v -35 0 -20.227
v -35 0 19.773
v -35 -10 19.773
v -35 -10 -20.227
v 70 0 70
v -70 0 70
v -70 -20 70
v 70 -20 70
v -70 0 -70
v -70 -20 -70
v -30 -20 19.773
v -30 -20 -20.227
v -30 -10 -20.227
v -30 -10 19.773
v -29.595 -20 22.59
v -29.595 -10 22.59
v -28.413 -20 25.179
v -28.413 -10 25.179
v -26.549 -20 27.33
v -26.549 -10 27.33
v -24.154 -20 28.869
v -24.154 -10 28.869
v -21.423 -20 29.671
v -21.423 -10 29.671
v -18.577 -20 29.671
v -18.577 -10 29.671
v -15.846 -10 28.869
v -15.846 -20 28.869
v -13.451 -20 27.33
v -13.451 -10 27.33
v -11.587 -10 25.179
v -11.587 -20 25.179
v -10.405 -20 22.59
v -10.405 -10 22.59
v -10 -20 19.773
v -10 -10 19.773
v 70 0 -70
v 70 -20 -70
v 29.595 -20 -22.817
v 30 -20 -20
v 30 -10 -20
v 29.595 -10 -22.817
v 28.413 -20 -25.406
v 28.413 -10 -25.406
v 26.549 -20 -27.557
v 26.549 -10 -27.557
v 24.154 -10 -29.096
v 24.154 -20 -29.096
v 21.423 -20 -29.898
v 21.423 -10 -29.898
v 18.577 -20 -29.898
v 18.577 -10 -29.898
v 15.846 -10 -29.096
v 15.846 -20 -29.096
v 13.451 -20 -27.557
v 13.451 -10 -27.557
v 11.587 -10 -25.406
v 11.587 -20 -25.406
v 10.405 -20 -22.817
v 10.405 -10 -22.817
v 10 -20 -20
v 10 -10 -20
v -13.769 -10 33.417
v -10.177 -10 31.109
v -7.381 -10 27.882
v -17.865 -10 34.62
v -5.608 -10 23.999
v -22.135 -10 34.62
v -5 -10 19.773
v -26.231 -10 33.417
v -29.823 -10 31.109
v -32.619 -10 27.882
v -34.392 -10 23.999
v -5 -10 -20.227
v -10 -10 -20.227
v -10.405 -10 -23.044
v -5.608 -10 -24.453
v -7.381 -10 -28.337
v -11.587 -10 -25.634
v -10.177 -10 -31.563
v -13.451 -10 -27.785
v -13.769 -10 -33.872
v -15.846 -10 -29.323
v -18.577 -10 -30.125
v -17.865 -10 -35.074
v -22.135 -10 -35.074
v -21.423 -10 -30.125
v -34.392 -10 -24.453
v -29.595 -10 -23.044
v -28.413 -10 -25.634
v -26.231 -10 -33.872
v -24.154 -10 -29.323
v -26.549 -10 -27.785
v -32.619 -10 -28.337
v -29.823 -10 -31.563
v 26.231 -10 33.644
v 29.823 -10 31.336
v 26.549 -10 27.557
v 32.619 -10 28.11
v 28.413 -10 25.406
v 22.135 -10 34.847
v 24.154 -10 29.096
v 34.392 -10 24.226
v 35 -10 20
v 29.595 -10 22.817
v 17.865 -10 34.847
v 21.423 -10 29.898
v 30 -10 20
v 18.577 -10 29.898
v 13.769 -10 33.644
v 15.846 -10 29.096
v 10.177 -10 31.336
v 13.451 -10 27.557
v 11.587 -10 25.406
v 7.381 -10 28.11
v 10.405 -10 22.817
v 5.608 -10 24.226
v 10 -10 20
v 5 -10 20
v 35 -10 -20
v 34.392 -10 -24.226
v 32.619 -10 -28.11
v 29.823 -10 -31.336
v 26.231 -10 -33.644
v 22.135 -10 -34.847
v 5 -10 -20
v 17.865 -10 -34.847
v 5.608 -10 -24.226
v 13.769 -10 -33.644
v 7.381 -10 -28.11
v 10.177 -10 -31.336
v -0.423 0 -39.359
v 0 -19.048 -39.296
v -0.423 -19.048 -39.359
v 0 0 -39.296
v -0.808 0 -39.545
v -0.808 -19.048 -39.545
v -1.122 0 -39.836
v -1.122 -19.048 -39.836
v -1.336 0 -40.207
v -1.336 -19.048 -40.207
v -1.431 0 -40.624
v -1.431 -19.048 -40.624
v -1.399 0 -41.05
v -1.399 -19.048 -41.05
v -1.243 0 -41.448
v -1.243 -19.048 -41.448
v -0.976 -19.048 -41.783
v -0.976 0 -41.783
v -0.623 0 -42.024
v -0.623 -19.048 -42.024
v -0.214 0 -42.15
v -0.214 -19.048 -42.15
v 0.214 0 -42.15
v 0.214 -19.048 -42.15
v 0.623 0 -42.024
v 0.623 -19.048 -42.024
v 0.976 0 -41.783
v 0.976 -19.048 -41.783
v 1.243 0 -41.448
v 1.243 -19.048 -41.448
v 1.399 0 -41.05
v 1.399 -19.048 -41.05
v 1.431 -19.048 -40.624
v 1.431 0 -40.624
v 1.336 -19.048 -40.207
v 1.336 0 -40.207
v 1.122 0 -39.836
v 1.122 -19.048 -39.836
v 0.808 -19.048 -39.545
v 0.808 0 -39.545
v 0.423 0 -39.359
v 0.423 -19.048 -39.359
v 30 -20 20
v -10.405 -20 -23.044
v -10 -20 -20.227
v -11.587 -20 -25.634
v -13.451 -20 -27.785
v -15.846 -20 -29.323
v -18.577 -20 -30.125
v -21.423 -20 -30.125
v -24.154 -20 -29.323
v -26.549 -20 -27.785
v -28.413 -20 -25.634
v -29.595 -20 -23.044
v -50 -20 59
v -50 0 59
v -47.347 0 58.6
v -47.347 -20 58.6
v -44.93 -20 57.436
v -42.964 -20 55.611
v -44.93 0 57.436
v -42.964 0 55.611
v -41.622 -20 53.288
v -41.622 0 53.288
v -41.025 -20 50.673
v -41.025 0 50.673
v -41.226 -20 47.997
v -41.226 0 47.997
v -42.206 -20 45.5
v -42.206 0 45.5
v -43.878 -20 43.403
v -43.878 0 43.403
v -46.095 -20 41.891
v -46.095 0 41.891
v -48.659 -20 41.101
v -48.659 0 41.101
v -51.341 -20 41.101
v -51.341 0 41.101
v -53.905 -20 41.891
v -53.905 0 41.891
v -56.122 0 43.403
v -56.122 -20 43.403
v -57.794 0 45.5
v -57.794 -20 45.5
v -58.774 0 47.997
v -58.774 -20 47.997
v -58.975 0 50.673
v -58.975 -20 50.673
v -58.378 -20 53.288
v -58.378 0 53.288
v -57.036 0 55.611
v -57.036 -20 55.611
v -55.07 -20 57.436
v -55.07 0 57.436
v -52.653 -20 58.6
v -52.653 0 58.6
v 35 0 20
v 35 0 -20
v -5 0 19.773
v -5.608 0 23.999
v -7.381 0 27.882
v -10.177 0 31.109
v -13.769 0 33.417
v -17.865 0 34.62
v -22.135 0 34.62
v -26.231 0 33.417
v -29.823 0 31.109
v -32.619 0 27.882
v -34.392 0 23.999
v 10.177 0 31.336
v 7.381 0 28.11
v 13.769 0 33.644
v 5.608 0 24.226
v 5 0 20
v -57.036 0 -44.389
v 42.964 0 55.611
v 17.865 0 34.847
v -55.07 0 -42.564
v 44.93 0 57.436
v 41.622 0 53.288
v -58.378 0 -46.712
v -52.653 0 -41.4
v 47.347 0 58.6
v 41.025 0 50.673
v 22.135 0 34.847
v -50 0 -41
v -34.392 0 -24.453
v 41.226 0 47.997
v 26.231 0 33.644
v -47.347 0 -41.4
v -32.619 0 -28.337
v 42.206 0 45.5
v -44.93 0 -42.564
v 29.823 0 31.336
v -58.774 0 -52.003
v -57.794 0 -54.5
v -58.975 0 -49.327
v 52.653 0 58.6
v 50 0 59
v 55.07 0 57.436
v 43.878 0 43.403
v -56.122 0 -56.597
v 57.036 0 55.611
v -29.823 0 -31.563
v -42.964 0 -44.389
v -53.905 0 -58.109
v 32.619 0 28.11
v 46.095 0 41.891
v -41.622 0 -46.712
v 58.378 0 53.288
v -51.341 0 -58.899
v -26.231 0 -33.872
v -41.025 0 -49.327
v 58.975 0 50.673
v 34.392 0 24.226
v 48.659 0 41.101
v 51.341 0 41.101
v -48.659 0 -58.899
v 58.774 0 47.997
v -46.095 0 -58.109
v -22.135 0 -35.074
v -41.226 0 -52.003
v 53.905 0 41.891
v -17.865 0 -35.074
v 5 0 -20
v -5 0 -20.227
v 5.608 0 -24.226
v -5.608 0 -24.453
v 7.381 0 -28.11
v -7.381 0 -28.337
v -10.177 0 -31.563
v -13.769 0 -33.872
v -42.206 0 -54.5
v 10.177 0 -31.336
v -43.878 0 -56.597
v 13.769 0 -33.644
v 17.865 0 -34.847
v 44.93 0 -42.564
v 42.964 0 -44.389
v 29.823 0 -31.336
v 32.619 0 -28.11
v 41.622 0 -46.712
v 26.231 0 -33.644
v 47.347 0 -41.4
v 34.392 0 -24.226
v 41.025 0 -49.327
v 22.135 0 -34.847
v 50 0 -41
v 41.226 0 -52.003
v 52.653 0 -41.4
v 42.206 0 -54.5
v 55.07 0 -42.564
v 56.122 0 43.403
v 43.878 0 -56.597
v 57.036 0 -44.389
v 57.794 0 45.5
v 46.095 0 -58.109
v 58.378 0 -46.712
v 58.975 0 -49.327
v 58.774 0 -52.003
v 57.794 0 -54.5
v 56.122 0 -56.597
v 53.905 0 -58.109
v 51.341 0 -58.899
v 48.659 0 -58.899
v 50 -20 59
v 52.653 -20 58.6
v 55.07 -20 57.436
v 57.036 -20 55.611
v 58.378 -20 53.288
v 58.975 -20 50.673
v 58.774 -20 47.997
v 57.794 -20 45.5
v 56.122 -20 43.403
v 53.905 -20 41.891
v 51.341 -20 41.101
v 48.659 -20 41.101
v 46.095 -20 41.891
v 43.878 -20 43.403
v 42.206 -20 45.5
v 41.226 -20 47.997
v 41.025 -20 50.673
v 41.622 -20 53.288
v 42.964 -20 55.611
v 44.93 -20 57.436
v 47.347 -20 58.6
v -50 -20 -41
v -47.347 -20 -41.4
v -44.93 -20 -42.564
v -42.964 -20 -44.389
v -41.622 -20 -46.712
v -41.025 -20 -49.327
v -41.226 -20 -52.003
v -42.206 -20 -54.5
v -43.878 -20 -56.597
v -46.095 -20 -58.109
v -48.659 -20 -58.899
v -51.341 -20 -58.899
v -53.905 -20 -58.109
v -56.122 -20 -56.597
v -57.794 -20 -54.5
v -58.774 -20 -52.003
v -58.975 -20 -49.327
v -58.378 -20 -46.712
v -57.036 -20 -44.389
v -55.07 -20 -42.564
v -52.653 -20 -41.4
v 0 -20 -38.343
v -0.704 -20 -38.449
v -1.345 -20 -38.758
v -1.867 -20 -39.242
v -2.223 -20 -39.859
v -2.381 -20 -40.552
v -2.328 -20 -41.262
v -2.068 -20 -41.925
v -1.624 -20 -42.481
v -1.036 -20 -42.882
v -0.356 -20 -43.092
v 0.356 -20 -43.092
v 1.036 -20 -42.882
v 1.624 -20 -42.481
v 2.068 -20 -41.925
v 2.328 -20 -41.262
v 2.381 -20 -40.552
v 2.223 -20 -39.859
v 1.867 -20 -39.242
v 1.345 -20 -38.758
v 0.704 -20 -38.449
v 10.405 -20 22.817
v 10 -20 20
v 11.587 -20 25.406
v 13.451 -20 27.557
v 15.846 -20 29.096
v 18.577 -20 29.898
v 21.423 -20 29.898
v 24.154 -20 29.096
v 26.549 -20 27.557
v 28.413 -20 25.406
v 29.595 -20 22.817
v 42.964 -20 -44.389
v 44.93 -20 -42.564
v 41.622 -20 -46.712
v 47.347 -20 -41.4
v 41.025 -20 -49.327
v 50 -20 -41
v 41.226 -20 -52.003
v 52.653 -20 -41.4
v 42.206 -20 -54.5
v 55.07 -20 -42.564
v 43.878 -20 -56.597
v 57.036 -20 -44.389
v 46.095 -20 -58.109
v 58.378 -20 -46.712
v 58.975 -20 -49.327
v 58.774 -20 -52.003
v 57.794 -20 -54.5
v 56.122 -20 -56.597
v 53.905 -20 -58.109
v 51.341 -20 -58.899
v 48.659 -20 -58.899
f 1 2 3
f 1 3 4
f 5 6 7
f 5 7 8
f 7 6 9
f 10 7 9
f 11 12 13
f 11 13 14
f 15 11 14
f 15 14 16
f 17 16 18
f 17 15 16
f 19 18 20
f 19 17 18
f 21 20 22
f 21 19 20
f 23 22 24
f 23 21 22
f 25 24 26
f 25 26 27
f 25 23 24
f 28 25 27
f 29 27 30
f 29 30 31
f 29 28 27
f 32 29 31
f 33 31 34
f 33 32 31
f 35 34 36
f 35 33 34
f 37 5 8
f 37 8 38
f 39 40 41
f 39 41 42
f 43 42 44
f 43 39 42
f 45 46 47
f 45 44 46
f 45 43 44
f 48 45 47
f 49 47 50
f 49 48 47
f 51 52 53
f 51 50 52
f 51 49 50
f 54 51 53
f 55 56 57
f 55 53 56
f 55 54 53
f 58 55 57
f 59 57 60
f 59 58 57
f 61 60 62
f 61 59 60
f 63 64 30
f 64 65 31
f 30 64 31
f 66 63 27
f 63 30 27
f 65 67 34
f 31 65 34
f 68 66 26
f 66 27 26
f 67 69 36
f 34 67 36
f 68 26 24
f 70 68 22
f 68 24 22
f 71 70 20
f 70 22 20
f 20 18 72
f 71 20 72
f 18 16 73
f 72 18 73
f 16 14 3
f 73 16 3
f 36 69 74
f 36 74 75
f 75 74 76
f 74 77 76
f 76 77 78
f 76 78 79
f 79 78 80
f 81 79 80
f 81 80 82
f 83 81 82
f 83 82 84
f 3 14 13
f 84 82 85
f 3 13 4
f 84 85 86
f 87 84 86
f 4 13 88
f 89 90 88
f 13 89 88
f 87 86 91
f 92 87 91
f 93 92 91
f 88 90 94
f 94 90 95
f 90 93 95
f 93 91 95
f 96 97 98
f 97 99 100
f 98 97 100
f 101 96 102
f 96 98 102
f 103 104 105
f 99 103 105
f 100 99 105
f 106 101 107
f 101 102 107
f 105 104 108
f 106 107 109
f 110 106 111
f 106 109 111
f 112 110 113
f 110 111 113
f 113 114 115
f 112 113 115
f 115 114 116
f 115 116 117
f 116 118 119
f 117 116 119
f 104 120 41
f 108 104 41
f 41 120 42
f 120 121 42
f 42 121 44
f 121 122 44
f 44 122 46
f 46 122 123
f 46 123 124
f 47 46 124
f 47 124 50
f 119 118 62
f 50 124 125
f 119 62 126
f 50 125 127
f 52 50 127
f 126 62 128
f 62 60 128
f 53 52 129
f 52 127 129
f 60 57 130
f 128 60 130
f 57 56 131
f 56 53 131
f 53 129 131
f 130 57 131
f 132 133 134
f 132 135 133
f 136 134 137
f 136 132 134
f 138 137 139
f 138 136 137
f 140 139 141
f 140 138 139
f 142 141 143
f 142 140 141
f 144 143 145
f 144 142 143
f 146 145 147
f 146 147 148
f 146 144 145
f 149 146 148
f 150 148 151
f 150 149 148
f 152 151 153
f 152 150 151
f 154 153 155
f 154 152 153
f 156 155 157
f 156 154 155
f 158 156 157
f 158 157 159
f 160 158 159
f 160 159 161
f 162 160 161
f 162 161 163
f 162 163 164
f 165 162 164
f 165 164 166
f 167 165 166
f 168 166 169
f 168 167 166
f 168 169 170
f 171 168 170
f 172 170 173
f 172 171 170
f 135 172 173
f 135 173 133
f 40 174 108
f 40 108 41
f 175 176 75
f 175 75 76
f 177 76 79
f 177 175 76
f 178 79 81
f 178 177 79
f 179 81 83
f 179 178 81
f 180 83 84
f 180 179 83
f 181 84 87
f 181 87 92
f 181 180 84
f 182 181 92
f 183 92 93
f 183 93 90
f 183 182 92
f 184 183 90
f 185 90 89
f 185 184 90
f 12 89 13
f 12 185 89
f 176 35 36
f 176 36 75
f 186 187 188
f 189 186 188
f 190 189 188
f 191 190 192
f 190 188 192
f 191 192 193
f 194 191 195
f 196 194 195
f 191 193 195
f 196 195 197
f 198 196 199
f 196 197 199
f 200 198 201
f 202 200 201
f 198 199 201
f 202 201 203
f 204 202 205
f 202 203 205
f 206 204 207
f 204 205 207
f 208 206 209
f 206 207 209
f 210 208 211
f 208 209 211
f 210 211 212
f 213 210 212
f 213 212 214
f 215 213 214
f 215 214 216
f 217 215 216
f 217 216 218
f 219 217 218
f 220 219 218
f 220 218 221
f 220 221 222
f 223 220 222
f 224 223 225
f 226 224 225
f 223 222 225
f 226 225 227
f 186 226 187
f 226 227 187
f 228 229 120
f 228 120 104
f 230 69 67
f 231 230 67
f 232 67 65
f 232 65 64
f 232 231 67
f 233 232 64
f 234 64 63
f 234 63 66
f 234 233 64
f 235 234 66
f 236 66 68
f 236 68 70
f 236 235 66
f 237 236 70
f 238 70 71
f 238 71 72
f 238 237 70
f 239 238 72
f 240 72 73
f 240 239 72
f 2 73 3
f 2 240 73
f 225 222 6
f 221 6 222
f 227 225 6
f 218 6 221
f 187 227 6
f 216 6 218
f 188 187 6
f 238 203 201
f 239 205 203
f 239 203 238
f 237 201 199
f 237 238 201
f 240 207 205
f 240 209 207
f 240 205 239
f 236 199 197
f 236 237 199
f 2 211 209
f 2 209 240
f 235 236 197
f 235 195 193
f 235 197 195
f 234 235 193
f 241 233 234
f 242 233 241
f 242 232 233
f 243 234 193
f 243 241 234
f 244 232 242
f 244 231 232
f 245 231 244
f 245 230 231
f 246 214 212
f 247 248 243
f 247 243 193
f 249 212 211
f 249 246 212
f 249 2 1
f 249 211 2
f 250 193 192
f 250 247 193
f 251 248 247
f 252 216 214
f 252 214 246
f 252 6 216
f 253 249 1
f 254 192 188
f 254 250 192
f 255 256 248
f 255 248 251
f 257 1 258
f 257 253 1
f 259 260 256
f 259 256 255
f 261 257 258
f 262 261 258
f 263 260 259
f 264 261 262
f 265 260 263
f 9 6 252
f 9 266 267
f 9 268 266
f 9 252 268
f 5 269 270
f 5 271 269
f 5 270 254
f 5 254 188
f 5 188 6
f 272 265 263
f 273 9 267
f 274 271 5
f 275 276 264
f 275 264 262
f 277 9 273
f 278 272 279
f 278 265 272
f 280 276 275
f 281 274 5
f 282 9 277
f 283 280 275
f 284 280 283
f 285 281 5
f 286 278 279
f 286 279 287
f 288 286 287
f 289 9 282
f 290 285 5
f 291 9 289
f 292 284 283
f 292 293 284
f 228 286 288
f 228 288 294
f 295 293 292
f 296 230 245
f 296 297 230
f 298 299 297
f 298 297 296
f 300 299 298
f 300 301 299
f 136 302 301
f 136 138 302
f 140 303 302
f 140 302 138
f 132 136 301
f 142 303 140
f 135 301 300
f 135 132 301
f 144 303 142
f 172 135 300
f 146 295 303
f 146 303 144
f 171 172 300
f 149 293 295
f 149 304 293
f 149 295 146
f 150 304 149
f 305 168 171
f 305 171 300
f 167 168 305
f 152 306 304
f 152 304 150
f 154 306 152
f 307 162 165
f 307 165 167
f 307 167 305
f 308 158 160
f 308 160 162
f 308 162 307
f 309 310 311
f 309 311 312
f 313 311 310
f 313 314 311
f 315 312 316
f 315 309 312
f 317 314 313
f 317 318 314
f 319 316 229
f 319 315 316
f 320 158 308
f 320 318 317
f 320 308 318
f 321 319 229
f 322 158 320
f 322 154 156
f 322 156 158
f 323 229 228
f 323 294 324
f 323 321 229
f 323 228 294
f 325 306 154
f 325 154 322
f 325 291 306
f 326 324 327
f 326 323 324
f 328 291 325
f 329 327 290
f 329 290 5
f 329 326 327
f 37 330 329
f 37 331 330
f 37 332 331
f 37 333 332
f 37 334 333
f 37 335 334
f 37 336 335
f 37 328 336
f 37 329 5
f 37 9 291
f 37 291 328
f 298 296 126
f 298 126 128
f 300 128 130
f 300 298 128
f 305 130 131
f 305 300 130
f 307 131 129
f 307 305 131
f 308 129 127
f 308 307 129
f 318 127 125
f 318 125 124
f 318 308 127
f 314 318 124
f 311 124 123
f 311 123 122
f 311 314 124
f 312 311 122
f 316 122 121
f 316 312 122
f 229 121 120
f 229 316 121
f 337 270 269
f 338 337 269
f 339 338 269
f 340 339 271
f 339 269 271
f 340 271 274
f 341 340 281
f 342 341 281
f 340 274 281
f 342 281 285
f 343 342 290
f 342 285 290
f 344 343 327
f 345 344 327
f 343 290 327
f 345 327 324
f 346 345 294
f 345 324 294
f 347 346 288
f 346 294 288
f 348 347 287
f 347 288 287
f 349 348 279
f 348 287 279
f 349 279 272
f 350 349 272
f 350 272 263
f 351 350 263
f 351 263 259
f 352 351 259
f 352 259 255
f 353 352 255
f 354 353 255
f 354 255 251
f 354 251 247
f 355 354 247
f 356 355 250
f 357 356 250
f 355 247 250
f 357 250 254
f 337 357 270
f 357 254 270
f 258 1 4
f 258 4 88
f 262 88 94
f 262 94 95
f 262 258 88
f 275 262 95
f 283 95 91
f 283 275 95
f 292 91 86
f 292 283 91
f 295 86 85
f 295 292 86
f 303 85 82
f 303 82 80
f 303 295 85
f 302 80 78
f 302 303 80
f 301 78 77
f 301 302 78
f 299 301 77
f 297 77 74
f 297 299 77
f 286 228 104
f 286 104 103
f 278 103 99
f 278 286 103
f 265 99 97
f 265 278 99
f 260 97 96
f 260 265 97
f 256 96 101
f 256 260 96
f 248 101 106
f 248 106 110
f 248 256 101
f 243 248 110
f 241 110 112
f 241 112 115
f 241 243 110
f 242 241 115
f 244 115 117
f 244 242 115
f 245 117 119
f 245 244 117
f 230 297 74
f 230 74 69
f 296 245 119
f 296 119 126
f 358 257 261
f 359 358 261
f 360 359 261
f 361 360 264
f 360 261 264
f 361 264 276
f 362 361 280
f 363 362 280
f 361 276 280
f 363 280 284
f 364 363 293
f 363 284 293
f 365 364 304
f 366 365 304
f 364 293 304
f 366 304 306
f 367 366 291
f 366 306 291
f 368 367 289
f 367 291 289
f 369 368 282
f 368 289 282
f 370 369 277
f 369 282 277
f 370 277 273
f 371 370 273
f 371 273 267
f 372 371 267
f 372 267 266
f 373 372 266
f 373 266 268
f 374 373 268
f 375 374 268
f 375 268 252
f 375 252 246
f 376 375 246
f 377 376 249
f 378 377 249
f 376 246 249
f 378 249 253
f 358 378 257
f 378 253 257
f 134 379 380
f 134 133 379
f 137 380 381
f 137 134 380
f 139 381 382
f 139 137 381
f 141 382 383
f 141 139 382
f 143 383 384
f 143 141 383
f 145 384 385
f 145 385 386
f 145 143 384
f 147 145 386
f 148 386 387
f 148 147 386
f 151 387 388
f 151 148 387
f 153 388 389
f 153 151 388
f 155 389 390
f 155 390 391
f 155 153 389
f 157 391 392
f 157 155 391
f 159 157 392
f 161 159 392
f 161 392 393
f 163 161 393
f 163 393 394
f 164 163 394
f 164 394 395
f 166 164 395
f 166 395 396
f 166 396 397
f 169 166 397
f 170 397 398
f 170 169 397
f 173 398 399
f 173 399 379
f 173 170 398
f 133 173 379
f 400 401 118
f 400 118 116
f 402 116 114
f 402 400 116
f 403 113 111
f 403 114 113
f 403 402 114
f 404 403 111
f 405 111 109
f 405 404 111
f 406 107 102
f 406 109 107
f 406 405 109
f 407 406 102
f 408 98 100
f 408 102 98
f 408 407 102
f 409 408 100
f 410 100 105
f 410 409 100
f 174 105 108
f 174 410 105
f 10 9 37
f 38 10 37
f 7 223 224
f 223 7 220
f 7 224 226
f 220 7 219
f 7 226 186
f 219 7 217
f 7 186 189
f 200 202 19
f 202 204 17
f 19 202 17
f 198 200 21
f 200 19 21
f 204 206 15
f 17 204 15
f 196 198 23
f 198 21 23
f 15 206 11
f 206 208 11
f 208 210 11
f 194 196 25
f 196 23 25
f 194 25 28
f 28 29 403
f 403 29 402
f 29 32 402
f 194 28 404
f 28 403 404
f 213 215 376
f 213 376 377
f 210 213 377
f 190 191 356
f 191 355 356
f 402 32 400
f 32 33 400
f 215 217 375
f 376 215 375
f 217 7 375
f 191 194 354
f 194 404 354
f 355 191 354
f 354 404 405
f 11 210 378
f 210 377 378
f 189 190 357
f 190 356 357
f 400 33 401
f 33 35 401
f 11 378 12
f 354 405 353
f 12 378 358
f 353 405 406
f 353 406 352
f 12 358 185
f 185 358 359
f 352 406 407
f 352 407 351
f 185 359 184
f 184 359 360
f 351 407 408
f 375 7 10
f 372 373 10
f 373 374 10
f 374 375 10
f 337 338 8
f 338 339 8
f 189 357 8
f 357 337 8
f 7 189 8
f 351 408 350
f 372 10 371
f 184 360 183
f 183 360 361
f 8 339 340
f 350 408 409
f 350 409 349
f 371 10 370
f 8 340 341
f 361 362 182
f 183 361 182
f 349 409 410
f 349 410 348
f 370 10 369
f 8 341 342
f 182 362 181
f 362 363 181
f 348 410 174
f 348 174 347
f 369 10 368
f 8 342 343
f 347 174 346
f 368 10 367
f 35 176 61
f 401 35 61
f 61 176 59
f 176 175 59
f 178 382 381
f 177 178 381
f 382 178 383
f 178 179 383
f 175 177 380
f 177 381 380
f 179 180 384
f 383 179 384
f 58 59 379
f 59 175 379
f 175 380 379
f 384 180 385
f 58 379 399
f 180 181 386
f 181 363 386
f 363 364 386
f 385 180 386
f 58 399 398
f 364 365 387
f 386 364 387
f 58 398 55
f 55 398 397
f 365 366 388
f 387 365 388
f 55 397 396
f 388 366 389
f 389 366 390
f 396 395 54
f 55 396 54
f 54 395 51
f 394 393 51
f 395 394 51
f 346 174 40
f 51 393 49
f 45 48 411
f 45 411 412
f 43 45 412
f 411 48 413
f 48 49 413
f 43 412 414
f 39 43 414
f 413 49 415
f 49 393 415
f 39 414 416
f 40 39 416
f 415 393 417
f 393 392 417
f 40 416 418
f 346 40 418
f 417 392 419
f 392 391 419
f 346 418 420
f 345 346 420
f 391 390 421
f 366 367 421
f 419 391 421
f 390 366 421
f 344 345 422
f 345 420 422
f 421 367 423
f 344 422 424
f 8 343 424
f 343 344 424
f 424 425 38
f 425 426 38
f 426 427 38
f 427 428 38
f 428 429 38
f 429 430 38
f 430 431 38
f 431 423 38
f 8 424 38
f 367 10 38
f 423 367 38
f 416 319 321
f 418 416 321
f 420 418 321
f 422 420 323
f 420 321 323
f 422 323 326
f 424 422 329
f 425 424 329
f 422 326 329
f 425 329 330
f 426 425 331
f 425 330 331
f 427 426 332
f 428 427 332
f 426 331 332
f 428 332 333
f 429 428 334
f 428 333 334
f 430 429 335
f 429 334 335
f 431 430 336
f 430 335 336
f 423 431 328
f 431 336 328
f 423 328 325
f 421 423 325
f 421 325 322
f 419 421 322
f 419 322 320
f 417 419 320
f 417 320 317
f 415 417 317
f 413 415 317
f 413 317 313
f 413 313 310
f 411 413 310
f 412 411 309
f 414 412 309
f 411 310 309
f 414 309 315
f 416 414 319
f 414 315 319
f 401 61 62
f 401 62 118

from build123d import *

# Parameters (mm, degrees)
IZIM1_W                     = 140
IZIM1_H                     = 140
IZIM1_R                     = 9
Y_KSEKLIK_EKSTR_ZYON1_DEPTH = 20
KES_EKSTR_ZYON1_DEPTH       = 10
KES_EKSTR_ZYON2_DEPTH       = 101.995049384


with BuildPart() as part:
    # Çizim1 → Yükseklik-Ekstrüzyon1 (new body)
    with BuildSketch(Plane(origin=(0, 0, 0), x_dir=(1, 0, 0), z_dir=(0, 1, 0))):
        Rectangle(IZIM1_W, IZIM1_H)
        with Locations(Location((-50, 50, 0), (0, 0, 270))):
            Circle(IZIM1_R, mode=Mode.SUBTRACT)
        with Locations(Location((50, 50, 0), (0, 0, 270))):
            Circle(IZIM1_R, mode=Mode.SUBTRACT)
        with Locations(Location((-50, -50, 0), (0, 0, 270))):
            Circle(IZIM1_R, mode=Mode.SUBTRACT)
        with Locations(Location((50, -50, 0), (0, 0, 270))):
            Circle(IZIM1_R, mode=Mode.SUBTRACT)
    extrude(amount=-Y_KSEKLIK_EKSTR_ZYON1_DEPTH)

    # Çizim4 → Kes-Ekstrüzyon1 (cut)
    # profile 1 of 2: a face of its own
    with BuildSketch(Plane(origin=(0, 0, 0), x_dir=(1, 0, 0), z_dir=(0, 1, 0))):
        with BuildLine():
            Line((-5, 20.227170593), (-5, -19.772829407))
            ThreePointArc((-5, -19.772829407), (-20, -34.772829407), (-35, -19.772829407))
            Line((-35, -19.772829407), (-35, 20.227170593))
            ThreePointArc((-35, 20.227170593), (-20, 35.227170593), (-5, 20.227170593))
        make_face()
        with BuildLine():
            Line((-30, 20.227170593), (-30, -19.772829407))
            ThreePointArc((-30, -19.772829407), (-20, -29.772829407), (-10, -19.772829407))
            Line((-10, -19.772829407), (-10, 20.227170593))
            ThreePointArc((-10, 20.227170593), (-20, 30.227170593), (-30, 20.227170593))
        make_face(mode=Mode.SUBTRACT)
    # profile 2 of 2: a face of its own
    with BuildSketch(Plane(origin=(0, 0, 0), x_dir=(1, 0, 0), z_dir=(0, 1, 0))):
        with BuildLine():
            Line((35, 20), (35, -20))
            ThreePointArc((35, -20), (20, -35), (5, -20))
            Line((5, -20), (5, 20))
            ThreePointArc((5, 20), (20, 35), (35, 20))
        make_face()
        with BuildLine():
            Line((30, 20), (30, -20))
            ThreePointArc((30, -20), (20, -30), (10, -20))
            Line((10, -20), (10, 20))
            ThreePointArc((10, 20), (20, 30), (30, 20))
        make_face(mode=Mode.SUBTRACT)
    extrude(amount=-KES_EKSTR_ZYON1_DEPTH, mode=Mode.SUBTRACT)

    # Çizim2 → Kes-Ekstrüzyon2 (cut, through all)
    with BuildSketch(Plane(origin=(0, -20, 0), x_dir=(-1, 0, 0), z_dir=(0, -1, 0))):
        with BuildLine():
            Line((-10, 20), (-10, -20))
            ThreePointArc((-10, -20), (-20, -30), (-30, -20))
            Line((-30, -20), (-30, 20))
            ThreePointArc((-30, 20), (-20, 30), (-10, 20))
        make_face()
        with BuildLine():
            Line((30, 20.227170593), (30, -19.772829407))
            ThreePointArc((30, -19.772829407), (20, -29.772829407), (10, -19.772829407))
            Line((10, -19.772829407), (10, 20.227170593))
            ThreePointArc((10, 20.227170593), (20, 30.227170593), (30, 20.227170593))
        make_face()
    extrude(amount=-KES_EKSTR_ZYON2_DEPTH, mode=Mode.SUBTRACT)

    # Çizim6 → #6-40 Dişli Delik1 (revolve, cut)
    with BuildSketch(Plane(origin=(0, 0, -40.730803154), x_dir=(0, 0, 1), z_dir=(1, 0, 0))):
        Polygon((0, 0), (0, 20), (2.3876, 20), (1.4351, 19.0475), (1.4351, 0), align=None)
    revolve(axis=Axis((0, 6.35, -40.730803154), (0, -1, 0)), mode=Mode.SUBTRACT)


solid = part.part
